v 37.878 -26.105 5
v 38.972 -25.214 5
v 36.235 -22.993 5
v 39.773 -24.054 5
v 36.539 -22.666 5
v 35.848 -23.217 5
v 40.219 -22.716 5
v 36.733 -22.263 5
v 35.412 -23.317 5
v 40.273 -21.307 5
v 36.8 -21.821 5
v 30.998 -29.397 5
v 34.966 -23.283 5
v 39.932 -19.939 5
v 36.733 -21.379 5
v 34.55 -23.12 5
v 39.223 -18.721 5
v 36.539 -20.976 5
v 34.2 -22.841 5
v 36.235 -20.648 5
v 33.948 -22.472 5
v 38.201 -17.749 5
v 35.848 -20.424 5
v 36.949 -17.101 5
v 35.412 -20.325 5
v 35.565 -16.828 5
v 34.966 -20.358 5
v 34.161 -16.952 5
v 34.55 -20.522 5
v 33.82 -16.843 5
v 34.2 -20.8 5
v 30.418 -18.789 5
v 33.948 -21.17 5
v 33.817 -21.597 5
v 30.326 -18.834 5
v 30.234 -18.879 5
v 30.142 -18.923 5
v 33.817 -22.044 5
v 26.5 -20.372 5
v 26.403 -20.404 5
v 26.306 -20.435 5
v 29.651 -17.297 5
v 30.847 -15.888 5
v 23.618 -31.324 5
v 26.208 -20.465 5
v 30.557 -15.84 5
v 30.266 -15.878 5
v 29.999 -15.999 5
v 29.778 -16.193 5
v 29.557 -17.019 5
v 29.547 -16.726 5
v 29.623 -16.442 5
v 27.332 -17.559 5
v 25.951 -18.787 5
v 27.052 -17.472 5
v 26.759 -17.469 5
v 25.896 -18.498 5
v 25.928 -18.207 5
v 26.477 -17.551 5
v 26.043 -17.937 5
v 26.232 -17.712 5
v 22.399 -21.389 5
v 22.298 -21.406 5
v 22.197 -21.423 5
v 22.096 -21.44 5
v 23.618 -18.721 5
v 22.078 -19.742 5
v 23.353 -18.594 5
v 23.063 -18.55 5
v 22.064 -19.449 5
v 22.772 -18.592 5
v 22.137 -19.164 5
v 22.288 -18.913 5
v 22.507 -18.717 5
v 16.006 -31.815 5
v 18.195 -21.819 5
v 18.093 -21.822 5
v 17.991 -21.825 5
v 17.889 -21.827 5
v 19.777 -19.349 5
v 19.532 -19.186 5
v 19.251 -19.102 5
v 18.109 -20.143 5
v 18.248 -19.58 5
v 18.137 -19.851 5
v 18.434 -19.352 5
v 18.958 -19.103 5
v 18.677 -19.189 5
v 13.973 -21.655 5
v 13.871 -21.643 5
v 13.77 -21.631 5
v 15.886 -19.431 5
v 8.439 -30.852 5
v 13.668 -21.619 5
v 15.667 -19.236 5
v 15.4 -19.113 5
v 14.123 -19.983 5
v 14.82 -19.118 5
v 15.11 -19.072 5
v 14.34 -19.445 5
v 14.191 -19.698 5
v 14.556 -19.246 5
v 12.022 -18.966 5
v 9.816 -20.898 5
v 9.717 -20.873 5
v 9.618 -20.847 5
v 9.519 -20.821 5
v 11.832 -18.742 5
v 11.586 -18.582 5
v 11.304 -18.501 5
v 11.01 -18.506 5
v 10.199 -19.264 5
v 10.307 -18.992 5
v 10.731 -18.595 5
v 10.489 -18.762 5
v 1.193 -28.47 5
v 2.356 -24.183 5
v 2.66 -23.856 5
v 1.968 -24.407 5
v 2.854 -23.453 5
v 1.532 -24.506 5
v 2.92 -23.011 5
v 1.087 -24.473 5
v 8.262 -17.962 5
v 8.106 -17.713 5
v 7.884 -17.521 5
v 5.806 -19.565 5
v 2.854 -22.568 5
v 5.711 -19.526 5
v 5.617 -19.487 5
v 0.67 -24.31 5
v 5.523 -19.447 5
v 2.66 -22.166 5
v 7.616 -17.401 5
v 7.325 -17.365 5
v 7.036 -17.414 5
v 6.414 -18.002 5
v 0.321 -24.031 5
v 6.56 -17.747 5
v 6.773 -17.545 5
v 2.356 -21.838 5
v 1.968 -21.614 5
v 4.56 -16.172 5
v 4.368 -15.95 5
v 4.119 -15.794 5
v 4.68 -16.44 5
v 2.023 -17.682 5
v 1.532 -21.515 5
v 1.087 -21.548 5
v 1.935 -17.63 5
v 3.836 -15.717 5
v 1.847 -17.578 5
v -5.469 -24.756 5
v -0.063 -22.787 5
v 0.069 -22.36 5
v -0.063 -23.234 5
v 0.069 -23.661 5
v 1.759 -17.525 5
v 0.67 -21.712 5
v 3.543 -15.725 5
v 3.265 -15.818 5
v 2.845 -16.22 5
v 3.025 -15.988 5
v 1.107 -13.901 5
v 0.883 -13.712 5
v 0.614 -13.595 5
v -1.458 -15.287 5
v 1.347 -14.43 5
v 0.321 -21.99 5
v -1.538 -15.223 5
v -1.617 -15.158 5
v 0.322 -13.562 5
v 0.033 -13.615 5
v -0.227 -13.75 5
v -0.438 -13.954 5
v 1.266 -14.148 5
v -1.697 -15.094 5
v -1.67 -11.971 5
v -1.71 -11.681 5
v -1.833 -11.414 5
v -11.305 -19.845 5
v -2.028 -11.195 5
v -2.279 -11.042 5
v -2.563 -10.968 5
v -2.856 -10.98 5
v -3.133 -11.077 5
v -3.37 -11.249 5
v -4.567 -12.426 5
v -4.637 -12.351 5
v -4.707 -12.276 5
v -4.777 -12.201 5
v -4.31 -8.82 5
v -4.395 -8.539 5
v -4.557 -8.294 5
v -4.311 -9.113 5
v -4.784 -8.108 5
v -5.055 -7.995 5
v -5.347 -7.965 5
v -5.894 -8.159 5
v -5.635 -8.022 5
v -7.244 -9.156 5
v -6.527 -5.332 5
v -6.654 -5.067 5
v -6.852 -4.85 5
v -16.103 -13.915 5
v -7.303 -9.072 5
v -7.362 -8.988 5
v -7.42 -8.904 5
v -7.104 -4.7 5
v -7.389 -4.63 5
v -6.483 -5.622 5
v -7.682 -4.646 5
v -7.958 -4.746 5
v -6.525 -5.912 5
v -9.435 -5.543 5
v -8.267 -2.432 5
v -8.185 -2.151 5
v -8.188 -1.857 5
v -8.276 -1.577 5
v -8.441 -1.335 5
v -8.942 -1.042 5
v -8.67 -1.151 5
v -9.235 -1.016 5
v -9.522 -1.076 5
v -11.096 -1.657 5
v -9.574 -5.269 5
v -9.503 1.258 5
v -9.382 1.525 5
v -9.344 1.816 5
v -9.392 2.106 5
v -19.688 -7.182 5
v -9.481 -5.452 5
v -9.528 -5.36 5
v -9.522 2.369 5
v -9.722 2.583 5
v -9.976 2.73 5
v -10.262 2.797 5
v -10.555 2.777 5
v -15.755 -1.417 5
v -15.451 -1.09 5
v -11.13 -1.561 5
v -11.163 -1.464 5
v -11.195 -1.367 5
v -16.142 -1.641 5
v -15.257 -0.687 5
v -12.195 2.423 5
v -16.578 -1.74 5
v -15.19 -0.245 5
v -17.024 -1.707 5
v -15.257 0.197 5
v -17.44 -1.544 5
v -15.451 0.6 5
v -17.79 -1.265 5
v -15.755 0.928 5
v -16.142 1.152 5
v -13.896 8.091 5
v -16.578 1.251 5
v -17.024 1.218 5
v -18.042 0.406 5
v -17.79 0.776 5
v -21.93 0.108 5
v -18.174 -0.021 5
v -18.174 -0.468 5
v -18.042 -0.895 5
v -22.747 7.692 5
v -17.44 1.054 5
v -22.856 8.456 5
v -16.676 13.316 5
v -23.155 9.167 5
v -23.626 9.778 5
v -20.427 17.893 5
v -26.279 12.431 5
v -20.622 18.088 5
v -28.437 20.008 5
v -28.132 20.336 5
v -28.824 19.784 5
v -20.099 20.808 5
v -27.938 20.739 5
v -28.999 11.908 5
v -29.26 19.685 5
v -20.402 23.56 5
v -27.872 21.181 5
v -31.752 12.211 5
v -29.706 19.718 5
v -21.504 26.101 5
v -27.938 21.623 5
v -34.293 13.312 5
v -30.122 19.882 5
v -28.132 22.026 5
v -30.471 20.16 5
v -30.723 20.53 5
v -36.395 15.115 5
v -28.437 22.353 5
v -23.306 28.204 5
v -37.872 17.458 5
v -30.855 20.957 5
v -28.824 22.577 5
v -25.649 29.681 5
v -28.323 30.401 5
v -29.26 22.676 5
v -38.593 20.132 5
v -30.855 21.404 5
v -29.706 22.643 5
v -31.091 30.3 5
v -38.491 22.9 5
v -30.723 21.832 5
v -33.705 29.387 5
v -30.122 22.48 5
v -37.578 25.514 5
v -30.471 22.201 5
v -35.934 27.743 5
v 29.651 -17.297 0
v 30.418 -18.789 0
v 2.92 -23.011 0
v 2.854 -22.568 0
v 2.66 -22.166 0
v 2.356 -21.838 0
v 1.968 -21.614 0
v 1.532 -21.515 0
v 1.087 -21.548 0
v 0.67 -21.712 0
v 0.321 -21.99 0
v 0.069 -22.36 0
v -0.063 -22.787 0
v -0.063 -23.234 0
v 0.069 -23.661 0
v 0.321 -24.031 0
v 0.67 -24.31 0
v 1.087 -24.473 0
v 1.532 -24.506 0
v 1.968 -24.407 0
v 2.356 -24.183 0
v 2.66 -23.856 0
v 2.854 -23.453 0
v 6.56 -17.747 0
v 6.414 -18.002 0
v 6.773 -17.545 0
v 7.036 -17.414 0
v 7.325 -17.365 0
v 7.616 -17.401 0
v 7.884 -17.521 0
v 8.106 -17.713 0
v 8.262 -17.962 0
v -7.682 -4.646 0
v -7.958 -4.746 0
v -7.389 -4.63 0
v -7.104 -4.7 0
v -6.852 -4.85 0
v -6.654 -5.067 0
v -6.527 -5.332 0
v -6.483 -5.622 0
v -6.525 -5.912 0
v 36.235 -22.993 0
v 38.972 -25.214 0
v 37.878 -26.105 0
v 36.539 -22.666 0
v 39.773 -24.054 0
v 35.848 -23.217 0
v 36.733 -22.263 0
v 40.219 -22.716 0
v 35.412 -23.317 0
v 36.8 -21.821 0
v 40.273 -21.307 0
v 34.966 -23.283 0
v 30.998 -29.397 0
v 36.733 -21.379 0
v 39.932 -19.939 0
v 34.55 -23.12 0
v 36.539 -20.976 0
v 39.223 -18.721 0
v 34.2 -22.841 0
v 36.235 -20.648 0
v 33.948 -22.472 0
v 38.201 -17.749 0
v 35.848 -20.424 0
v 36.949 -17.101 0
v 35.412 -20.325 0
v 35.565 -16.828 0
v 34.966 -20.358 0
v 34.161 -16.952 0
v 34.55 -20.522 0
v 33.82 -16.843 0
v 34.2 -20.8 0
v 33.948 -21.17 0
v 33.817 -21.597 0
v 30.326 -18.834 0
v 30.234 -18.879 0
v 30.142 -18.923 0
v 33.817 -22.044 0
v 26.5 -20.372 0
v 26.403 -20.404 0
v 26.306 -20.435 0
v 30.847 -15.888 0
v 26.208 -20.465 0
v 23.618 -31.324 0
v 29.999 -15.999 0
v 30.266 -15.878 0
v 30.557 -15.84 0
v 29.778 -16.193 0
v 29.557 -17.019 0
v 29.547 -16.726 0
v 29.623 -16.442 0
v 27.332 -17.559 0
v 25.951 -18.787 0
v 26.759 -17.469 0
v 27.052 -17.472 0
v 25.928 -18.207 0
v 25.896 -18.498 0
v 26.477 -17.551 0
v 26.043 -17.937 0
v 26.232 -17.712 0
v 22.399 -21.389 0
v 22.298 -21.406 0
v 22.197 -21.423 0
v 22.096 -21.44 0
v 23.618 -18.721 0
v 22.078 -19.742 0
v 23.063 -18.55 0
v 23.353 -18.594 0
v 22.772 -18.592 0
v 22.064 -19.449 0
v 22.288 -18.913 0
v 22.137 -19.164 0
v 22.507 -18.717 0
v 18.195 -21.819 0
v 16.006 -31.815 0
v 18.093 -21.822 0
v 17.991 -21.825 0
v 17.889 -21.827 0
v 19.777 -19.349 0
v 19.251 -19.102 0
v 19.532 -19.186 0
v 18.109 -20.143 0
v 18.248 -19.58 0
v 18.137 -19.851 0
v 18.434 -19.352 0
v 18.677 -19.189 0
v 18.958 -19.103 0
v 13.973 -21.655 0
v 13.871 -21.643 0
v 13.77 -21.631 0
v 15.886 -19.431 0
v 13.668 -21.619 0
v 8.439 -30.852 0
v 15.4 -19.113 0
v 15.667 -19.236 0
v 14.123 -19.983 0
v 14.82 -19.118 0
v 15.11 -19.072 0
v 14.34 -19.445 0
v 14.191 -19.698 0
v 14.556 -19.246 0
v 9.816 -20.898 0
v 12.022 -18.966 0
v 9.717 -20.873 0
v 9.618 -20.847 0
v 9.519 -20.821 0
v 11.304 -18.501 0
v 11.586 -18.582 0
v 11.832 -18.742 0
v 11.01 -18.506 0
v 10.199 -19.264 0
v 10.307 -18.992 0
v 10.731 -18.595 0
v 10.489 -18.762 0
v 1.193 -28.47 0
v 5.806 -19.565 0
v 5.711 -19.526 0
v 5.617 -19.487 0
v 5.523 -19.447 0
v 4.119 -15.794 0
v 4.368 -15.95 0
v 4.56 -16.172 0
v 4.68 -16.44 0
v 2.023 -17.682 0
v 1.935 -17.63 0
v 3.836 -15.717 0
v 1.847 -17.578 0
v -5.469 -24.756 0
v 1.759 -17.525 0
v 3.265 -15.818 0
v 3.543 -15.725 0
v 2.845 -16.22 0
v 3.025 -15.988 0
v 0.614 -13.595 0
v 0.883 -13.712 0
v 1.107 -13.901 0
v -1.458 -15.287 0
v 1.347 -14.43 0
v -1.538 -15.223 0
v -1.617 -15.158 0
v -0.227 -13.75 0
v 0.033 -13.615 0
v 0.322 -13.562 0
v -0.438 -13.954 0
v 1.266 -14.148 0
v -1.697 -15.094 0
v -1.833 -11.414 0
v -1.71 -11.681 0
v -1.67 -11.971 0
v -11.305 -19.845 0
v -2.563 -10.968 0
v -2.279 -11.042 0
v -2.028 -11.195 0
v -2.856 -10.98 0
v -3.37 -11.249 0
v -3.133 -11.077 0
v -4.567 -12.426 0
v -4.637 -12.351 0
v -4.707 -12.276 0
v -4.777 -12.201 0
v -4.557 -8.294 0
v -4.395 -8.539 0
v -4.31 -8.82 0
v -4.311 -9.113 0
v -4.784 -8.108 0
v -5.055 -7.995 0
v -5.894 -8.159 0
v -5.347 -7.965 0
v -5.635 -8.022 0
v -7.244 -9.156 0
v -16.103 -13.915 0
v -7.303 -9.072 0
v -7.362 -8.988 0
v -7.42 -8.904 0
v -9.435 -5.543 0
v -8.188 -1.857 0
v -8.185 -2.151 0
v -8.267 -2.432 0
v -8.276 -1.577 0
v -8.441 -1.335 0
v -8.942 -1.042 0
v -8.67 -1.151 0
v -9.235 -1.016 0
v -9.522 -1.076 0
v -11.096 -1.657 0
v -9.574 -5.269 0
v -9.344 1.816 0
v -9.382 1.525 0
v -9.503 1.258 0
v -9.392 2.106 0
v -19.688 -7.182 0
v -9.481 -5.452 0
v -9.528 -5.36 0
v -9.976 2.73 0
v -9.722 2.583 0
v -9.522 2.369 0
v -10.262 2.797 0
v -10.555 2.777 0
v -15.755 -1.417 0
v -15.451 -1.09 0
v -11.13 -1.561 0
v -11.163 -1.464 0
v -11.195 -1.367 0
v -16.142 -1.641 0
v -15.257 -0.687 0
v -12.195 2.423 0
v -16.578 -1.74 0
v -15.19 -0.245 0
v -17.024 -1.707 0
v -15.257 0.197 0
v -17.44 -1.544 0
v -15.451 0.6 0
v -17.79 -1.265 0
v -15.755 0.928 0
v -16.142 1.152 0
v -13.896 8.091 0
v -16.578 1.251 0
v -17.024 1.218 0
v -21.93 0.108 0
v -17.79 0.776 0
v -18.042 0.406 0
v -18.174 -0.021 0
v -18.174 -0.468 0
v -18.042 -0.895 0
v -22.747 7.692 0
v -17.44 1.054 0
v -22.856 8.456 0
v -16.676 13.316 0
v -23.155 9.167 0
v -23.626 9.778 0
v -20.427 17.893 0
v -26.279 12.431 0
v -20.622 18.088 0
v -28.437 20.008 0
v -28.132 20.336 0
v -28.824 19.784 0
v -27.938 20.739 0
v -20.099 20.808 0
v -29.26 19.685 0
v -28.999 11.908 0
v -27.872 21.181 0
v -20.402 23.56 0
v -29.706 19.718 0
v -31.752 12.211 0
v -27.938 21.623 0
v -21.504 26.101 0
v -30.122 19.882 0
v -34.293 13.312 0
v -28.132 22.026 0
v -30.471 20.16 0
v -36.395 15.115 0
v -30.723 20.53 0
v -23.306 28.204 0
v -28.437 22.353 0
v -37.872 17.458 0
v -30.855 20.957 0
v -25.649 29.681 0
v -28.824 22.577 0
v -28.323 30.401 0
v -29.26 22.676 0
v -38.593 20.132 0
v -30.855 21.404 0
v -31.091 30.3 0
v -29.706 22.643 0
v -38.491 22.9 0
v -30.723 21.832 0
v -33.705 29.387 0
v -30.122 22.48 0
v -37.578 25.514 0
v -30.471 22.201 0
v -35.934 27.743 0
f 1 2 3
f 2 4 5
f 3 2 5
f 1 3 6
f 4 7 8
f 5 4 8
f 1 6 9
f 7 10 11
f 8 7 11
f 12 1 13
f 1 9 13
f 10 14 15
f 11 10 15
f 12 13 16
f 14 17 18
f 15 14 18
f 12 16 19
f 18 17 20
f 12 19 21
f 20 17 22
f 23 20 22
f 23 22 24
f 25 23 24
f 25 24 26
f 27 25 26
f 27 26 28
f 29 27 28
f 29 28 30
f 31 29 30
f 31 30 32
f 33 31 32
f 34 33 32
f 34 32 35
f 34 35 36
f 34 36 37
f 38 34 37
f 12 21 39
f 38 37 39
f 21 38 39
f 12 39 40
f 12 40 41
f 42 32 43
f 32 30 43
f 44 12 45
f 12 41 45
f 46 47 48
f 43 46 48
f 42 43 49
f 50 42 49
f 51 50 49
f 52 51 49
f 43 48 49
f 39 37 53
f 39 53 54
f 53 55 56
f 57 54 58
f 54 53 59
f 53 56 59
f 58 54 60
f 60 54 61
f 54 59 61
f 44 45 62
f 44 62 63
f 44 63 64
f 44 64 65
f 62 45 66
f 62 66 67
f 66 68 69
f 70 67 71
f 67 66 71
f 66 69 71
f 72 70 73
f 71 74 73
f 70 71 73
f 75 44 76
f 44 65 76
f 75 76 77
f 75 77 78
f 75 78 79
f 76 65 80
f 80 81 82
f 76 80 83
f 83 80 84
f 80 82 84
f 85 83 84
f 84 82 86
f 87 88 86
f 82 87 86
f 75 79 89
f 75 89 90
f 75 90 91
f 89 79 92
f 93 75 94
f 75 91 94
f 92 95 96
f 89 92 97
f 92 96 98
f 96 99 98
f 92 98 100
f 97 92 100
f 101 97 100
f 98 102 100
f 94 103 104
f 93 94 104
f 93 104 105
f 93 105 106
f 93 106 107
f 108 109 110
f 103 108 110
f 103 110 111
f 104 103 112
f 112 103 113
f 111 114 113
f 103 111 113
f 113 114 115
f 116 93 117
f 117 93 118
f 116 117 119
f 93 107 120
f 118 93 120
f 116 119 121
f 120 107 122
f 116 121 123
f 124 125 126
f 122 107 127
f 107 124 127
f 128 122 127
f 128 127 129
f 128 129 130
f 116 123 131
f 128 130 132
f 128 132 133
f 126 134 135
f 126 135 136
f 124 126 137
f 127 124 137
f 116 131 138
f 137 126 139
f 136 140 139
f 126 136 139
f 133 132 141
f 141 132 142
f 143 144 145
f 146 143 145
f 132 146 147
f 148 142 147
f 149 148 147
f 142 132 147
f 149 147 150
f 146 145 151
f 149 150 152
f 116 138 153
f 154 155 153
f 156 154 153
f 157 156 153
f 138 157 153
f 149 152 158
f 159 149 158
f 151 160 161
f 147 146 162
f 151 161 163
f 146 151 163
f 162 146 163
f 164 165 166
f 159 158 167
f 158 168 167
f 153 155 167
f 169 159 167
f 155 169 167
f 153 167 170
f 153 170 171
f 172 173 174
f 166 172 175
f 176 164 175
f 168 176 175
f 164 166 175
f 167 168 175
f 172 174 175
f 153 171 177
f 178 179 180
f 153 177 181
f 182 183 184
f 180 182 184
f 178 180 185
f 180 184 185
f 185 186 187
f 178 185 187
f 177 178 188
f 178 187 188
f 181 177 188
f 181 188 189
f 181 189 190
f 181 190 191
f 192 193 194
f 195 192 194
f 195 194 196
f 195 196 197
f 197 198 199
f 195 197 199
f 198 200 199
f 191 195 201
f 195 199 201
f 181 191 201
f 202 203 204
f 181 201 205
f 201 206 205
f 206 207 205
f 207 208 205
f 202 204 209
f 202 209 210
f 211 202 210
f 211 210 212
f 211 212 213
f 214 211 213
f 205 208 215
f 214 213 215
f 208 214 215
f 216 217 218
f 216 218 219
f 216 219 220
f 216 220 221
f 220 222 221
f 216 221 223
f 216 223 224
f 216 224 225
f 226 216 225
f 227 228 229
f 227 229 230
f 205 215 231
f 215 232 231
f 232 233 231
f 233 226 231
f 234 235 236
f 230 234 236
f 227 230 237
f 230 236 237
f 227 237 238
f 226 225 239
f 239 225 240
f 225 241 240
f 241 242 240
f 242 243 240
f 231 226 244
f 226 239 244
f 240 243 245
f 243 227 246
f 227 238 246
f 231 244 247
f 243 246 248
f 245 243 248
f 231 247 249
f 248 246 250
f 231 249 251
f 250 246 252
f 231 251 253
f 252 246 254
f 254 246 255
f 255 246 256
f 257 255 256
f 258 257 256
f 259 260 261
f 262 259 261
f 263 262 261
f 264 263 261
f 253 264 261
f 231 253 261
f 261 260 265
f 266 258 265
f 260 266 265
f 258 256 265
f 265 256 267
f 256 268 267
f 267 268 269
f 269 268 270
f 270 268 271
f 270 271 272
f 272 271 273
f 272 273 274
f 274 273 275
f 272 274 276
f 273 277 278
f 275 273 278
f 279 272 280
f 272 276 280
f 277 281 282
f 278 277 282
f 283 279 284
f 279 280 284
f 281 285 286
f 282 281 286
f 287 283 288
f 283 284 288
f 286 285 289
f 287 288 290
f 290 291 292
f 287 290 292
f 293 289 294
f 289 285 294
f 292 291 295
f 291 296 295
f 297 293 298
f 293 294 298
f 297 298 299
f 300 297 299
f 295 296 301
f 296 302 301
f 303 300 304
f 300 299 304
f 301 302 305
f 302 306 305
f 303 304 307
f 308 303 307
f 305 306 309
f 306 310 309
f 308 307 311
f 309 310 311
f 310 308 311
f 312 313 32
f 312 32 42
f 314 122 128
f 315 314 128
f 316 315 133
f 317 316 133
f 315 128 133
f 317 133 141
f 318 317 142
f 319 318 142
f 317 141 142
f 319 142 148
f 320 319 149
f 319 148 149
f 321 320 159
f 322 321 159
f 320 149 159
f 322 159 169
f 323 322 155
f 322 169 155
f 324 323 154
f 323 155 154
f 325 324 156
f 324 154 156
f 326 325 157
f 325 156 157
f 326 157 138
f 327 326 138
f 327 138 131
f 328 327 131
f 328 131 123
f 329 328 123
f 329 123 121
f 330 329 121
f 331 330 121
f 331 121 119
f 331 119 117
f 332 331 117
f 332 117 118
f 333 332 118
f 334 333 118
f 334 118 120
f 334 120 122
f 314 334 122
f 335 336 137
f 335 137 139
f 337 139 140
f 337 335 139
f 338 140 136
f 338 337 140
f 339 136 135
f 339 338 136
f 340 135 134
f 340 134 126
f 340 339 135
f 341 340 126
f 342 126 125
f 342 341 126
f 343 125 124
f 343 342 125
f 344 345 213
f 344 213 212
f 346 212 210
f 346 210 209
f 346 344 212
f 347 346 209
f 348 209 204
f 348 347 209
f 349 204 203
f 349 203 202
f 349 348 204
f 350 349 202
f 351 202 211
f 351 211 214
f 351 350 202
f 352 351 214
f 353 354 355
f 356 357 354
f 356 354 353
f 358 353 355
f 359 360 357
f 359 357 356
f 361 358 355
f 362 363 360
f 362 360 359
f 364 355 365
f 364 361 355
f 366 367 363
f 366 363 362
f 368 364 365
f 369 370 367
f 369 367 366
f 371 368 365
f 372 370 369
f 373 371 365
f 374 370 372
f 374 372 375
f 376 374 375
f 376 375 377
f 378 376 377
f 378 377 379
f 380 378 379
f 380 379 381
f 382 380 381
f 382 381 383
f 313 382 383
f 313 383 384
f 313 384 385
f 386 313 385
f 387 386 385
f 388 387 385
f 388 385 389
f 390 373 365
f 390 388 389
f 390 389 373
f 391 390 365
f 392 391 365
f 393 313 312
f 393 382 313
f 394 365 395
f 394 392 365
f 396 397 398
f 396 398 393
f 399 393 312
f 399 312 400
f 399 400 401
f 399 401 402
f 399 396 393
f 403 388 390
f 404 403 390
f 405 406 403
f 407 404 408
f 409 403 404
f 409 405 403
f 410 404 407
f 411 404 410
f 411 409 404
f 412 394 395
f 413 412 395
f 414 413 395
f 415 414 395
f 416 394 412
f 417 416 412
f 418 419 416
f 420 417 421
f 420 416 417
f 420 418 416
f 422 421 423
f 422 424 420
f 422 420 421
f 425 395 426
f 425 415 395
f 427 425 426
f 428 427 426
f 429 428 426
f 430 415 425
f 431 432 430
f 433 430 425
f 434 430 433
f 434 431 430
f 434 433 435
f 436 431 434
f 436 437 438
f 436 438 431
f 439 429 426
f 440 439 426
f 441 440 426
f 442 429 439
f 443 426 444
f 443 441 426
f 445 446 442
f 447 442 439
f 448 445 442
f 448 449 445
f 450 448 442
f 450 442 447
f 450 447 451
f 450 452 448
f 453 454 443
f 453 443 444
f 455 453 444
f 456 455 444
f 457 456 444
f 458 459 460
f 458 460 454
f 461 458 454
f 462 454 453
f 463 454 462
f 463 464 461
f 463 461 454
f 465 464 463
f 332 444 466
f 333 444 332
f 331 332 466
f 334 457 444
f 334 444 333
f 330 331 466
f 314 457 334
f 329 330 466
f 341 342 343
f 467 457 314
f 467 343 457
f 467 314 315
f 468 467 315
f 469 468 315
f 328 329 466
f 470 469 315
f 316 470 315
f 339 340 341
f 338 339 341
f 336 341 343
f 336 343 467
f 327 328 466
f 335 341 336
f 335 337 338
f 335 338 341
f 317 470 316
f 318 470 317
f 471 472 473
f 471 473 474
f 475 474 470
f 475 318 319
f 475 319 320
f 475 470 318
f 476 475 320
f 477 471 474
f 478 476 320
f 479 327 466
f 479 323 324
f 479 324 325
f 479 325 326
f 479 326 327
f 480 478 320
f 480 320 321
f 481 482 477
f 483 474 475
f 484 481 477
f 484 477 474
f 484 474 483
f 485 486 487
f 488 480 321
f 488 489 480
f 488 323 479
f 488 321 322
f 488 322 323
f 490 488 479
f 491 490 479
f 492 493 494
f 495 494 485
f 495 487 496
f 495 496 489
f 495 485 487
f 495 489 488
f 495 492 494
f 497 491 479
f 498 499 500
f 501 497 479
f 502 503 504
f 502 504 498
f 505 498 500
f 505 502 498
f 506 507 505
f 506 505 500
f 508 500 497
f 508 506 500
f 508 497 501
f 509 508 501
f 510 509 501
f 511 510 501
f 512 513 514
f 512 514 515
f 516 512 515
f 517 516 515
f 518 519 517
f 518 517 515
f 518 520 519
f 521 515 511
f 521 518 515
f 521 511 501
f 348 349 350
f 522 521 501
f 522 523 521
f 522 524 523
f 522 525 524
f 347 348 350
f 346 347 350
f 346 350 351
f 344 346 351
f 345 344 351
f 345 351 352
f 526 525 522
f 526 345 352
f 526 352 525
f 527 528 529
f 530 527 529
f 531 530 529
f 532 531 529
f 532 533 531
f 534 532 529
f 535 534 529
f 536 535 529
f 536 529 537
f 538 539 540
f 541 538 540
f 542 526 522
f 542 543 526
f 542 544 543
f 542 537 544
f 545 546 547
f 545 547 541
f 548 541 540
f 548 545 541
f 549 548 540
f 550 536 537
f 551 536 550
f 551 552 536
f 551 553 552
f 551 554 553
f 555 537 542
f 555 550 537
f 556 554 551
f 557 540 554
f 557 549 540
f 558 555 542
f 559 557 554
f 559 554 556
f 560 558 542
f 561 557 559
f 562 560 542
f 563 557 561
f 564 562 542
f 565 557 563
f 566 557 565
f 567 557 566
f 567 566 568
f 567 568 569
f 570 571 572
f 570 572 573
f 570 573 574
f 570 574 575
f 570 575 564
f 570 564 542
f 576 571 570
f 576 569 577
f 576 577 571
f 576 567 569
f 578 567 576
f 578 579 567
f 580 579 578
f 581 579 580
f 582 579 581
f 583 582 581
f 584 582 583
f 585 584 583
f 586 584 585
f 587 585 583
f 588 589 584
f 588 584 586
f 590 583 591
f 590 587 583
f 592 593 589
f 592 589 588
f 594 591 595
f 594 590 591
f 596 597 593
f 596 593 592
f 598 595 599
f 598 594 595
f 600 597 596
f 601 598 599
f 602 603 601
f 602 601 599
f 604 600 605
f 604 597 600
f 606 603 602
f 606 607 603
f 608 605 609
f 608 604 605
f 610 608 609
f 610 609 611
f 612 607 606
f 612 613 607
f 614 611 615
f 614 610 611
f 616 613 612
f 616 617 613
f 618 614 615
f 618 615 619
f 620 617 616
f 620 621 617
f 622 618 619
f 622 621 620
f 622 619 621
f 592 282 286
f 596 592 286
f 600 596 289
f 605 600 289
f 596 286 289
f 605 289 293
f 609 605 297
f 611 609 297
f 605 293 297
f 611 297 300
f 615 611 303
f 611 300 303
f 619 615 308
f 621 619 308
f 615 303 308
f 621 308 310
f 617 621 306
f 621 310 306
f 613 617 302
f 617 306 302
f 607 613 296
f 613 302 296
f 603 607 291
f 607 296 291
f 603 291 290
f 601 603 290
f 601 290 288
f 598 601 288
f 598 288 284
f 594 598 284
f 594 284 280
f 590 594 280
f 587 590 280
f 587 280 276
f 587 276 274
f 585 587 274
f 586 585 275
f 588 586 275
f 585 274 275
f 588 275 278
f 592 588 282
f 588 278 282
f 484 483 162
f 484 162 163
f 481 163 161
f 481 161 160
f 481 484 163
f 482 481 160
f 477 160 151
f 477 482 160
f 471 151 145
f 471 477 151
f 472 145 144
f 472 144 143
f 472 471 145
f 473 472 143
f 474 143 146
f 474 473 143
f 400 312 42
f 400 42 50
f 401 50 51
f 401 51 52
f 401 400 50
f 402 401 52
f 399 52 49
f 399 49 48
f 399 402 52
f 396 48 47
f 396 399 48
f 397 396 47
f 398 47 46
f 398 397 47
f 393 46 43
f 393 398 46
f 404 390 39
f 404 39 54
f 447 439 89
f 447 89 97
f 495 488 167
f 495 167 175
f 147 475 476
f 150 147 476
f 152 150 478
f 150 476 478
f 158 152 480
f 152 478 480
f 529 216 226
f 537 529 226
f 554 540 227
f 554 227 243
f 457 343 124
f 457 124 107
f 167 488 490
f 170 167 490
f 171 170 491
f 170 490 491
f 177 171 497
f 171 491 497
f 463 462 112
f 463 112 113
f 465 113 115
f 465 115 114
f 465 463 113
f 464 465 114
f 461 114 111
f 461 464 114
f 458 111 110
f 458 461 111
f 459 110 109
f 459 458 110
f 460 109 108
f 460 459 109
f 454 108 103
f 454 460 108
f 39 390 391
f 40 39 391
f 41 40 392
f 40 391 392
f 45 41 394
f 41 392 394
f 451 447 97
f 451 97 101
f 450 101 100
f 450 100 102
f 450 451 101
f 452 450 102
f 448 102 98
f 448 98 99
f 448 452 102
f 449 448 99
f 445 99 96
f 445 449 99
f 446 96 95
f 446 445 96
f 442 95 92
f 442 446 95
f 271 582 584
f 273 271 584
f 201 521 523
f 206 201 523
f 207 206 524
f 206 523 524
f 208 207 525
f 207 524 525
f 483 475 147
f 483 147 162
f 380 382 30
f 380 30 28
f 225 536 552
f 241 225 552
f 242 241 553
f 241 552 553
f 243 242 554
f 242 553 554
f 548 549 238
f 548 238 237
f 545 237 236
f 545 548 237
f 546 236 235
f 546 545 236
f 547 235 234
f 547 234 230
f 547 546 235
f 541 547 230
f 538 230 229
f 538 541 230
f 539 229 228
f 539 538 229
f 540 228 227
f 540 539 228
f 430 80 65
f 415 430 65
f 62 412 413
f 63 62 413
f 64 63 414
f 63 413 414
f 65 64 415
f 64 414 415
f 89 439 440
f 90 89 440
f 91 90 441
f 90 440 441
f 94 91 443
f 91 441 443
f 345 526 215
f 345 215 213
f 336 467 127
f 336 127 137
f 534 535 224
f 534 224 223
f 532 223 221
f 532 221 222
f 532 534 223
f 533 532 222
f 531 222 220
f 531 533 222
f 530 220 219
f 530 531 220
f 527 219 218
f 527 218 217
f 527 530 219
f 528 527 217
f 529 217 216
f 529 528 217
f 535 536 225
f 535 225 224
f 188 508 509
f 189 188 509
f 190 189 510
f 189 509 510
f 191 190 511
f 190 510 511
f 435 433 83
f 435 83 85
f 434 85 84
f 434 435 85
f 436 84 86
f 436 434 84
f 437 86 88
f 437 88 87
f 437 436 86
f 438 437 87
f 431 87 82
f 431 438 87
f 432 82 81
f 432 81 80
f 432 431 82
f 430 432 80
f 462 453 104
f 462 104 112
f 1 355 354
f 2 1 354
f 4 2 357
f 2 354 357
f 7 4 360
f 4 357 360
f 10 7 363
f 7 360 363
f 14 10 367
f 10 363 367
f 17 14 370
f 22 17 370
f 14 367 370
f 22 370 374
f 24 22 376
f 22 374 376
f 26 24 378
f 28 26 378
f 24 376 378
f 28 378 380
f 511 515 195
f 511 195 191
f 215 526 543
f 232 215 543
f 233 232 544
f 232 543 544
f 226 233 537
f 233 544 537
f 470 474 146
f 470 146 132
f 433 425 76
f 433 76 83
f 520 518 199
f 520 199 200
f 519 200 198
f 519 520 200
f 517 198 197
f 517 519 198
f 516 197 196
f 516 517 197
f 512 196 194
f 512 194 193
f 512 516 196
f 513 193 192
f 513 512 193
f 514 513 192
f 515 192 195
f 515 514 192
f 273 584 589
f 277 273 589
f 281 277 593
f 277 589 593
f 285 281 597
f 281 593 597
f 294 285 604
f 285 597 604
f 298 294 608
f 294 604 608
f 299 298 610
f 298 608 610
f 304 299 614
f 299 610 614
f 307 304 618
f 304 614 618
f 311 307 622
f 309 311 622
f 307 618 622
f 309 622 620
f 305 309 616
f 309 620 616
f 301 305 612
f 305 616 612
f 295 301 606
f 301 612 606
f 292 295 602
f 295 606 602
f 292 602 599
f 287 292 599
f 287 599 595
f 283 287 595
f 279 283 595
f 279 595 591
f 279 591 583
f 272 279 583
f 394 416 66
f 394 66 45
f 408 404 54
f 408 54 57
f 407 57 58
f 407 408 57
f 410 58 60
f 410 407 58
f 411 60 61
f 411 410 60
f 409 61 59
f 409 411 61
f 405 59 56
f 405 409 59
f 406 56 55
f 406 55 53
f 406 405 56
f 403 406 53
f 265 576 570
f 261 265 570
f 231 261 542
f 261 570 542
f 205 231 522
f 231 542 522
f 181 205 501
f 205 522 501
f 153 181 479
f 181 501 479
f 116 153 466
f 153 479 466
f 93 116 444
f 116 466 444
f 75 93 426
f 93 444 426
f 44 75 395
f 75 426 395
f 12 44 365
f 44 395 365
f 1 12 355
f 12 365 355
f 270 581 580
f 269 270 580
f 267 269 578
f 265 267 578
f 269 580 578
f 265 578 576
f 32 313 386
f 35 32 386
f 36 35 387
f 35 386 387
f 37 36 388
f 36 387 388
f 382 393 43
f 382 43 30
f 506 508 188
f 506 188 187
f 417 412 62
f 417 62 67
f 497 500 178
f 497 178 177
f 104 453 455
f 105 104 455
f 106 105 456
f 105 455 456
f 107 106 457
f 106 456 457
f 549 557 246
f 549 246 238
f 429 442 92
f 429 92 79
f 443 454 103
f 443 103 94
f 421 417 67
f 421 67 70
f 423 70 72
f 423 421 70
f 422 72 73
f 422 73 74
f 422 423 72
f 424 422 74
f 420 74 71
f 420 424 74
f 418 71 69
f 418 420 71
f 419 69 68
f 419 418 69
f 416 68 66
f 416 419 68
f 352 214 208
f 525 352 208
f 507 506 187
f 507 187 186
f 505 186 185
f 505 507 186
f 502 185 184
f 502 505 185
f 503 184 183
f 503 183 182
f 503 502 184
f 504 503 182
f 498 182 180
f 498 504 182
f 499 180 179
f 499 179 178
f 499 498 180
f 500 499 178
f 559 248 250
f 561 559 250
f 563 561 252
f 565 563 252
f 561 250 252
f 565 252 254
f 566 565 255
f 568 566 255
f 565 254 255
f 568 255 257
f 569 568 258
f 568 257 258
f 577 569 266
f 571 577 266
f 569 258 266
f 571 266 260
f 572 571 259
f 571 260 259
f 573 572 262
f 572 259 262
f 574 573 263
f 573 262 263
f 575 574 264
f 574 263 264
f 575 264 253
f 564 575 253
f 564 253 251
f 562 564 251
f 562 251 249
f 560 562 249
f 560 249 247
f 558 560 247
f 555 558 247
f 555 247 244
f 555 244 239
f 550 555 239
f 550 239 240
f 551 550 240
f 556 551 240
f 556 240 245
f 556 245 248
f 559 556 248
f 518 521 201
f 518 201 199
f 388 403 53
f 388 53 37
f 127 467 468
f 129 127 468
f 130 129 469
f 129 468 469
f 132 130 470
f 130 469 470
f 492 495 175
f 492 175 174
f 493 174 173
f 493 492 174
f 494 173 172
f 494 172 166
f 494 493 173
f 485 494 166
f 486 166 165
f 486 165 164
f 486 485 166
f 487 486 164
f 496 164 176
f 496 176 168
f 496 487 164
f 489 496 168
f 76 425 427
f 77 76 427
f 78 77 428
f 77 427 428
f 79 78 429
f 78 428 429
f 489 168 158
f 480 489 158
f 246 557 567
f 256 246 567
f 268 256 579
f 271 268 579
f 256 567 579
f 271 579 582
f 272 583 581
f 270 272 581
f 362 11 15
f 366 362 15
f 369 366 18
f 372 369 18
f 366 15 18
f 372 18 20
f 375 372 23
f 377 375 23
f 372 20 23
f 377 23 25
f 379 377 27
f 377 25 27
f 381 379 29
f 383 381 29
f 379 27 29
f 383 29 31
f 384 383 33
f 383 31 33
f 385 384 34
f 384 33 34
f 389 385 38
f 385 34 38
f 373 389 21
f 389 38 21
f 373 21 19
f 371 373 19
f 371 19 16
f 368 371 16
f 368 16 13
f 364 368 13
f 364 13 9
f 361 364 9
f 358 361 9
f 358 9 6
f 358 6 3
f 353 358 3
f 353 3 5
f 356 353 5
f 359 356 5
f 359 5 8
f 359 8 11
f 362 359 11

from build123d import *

# Parameters (mm, degrees)
ESQUISSE1_R             = 3.5
BOSS_EXTRU_1_DEPTH      = 5
ESQUISSE2_R             = 3.5
ESQUISSE2_R_2           = 1.5
BOSS_EXTRU_2_DEPTH      = 5
ESQUISSE3_R             = 1.5
ENL_V_MAT_EXTRU_1_DEPTH = 52.599228309
BOSS_EXTRU_3_DEPTH      = 5


with BuildPart() as part:
    # Esquisse1 → Boss.-Extru.1 (new body)
    with BuildSketch(Plane.XY):
        with BuildLine():
            Line((-26.278959381, 12.43097678), (-23.625738837, 9.777756236))
            ThreePointArc((-23.625738837, 9.777756236), (-22.982271103, 8.820887218), (-22.747269794, 7.691983578))
            ThreePointArc((-22.747269794, 7.691983578), (-2.226699014, -26.772009928), (37.87835279, -26.104557126))
            ThreePointArc((37.87835279, -26.104557126), (39.583612673, -19.242189551), (32.721245099, -17.536929668))
            ThreePointArc((32.721245099, -17.536929668), (5.06736173, -19.249102003), (-12.195220044, 2.422816923))
            ThreePointArc((-12.195220044, 2.422816923), (-15.15644736, 10.772312527), (-20.427158676, 17.892884575))
            Line((-20.427158676, 17.892884575), (-20.622105131, 18.08783103))
            ThreePointArc((-20.622105131, 18.08783103), (-35.933936854, 27.742808503), (-26.278959381, 12.43097678))
        make_face()
        with Locations((-29.371809148, 21.180680797)):
            Circle(ESQUISSE1_R, mode=Mode.SUBTRACT)
    extrude(amount=BOSS_EXTRU_1_DEPTH)

    # Esquisse2 → Boss.-Extru.2 (add, through all)
    with BuildSketch(Plane.XY.offset(5)):
        with Locations((-29.371809148, 21.180680797)):
            Circle(ESQUISSE2_R)
        with Locations((-29.371809148, 21.180680797)):
            Circle(ESQUISSE2_R_2, mode=Mode.SUBTRACT)
    extrude(amount=-BOSS_EXTRU_2_DEPTH)

    # Esquisse3 → Enlèv. mat.-Extru.1 (cut, through all)
    with BuildSketch(Plane.XY.offset(5)):
        with Locations((35.299798944, -21.820743397)):
            Circle(ESQUISSE3_R)
        with Locations((1.420331358, -23.010555966)):
            Circle(ESQUISSE3_R)
        with Locations((-16.690323797, -0.244656241)):
            Circle(ESQUISSE3_R)
    extrude(amount=-ENL_V_MAT_EXTRU_1_DEPTH, mode=Mode.SUBTRACT)

    # Esquisse4 → Boss.-Extru.3 (add, through all)
    with BuildSketch(Plane(origin=(0, 0, 0), x_dir=(-1, 0, 0), z_dir=(0, 0, -1))):
        with BuildLine():
            ThreePointArc((-32.721245099, -17.536929668), (-31.583474438, -18.188350077), (-30.418328753, -18.789437557))
            Line((-30.418328753, -18.789437557), (-29.651415378, -17.296811968))
            ThreePointArc((-29.651415378, -17.296811968), (-29.778275742, -16.192937164), (-30.846670439, -15.887706259))
            Line((-30.846670439, -15.887706259), (-33.82002484, -16.842679657))
            Line((-33.82002484, -16.842679657), (-34.160934368, -16.952171997))
            ThreePointArc((-34.160934368, -16.952171997), (-33.418234352, -17.188280263), (-32.721245099, -17.536929668))
        make_face()
        with BuildLine():
            ThreePointArc((-30.141880226, -18.922742606), (-28.344838513, -19.707023958), (-26.500403555, -20.372242602))
            Line((-26.500403555, -20.372242602), (-25.950815291, -18.786670146))
            ThreePointArc((-25.950815291, -18.786670146), (-26.231514379, -17.711569612), (-27.332196648, -17.559478592))
            Line((-27.332196648, -17.559478592), (-30.141880226, -18.922742606))
        make_face()
        with BuildLine():
            ThreePointArc((-26.207967618, -20.465383608), (-24.318558502, -20.989396346), (-22.398954871, -21.388868572))
            Line((-22.398954871, -21.388868572), (-22.07759519, -19.741805965))
            ThreePointArc((-22.07759519, -19.741805965), (-22.506564116, -18.716808992), (-23.617697141, -18.720875242))
            Line((-23.617697141, -18.720875242), (-26.207967618, -20.465383608))
        make_face()
        with BuildLine():
            ThreePointArc((-22.096333261, -21.439997678), (-20.152041379, -21.693345733), (-18.195352752, -21.819146273))
            Line((-18.195352752, -21.819146273), (-18.108597219, -20.143270158))
            ThreePointArc((-18.108597219, -20.143270158), (-18.677325521, -19.188712012), (-19.776865153, -19.348854862))
            Line((-19.776865153, -19.348854862), (-22.096333261, -21.439997678))
        make_face()
        with BuildLine():
            ThreePointArc((-17.888549284, -21.827249111), (-15.927948113, -21.804906224), (-13.972993908, -21.654539278))
            Line((-13.972993908, -21.654539278), (-14.122563696, -19.983097938))
            ThreePointArc((-14.122563696, -19.983097938), (-14.819768177, -19.117916427), (-15.88590027, -19.430958747))
            Line((-15.88590027, -19.430958747), (-17.888549284, -21.827249111))
        make_face()
        with BuildLine():
            ThreePointArc((-13.668095361, -21.619455093), (-11.730081941, -21.321864532), (-9.815647169, -20.898313282))
            Line((-9.815647169, -20.898313282), (-10.19857491, -19.264467016))
            ThreePointArc((-10.19857491, -19.264467016), (-11.010423491, -18.505826774), (-12.021996685, -18.96555801))
            Line((-12.021996685, -18.96555801), (-13.668095361, -21.619455093))
        make_face()
        with BuildLine():
            ThreePointArc((-9.51870253, -20.820738122), (-7.641725776, -20.253803889), (-5.805791566, -19.565471313))
            Line((-5.805791566, -19.565471313), (-6.414480226, -18.00163456))
            ThreePointArc((-6.414480226, -18.00163456), (-7.324866364, -17.364586511), (-8.261811709, -17.961885897))
            Line((-8.261811709, -17.961885897), (-9.51870253, -20.820738122))
        make_face()
        with BuildLine():
            ThreePointArc((-5.522692022, -19.446944218), (-3.743989923, -18.621913915), (-2.022980005, -17.68245608))
            Line((-2.022980005, -17.68245608), (-2.8453536, -16.219654336))
            ThreePointArc((-2.8453536, -16.219654336), (-3.836215831, -15.716837097), (-4.679944946, -16.439854603))
            Line((-4.679944946, -16.439854603), (-5.522692022, -19.446944218))
        make_face()
        with BuildLine():
            ThreePointArc((-1.759342065, -17.52532855), (-0.114202903, -16.458570238), (1.457739014, -15.286625373))
            Line((1.457739014, -15.286625373), (0.437995836, -13.953879663))
            ThreePointArc((0.437995836, -13.953879663), (-0.61368443, -13.595268797), (-1.347458283, -14.429660233))
            Line((-1.347458283, -14.429660233), (-1.759342065, -17.52532855))
        make_face()
        with BuildLine():
            Line((9.503225829, 1.258047301), (11.195220044, -1.366827201))
            ThreePointArc((11.195220044, -1.366827201), (11.75717366, 0.511646725), (12.195220044, 2.422816923))
            Line((12.195220044, 2.422816923), (10.554962651, 2.777278429))
            ThreePointArc((10.554962651, 2.777278429), (9.521535347, 2.369036904), (9.503225829, 1.258047301))
        make_face()
        with BuildLine():
            ThreePointArc((9.573674437, -5.268877882), (10.393983884, -3.487993672), (11.096209126, -1.657328255))
            Line((11.096209126, -1.657328255), (9.522025266, -1.075922675))
            ThreePointArc((9.522025266, -1.075922675), (8.44149028, -1.334915489), (8.267265601, -2.432311906))
            Line((8.267265601, -2.432311906), (9.573674437, -5.268877882))
        make_face()
        with BuildLine():
            ThreePointArc((7.419966271, -8.904390336), (8.482357148, -7.256427417), (9.43482956, -5.542585982))
            Line((9.43482956, -5.542585982), (7.957950007, -4.745771034))
            ThreePointArc((7.957950007, -4.745771034), (6.851744443, -4.850376889), (6.525061109, -5.912408496))
            Line((6.525061109, -5.912408496), (7.419966271, -8.904390336))
        make_face()
        with BuildLine():
            ThreePointArc((4.776823702, -12.201238381), (6.060218871, -10.718891256), (7.244042024, -9.155875293))
            Line((7.244042024, -9.155875293), (5.893767102, -8.159459262))
            ThreePointArc((5.893767102, -8.159459262), (4.783837353, -8.107602847), (4.311176546, -9.113199633))
            Line((4.311176546, -9.113199633), (4.776823702, -12.201238381))
        make_face()
        with BuildLine():
            ThreePointArc((1.696684946, -15.094014714), (3.175622689, -13.806692179), (4.567310309, -12.425510899))
            Line((4.567310309, -12.425510899), (3.370428584, -11.249262026))
            ThreePointArc((3.370428584, -11.249262026), (2.278794929, -11.041972137), (1.66953393, -11.971183722))
            Line((1.66953393, -11.971183722), (1.696684946, -15.094014714))
        make_face()
    extrude(amount=-BOSS_EXTRU_3_DEPTH)


solid = part.part
